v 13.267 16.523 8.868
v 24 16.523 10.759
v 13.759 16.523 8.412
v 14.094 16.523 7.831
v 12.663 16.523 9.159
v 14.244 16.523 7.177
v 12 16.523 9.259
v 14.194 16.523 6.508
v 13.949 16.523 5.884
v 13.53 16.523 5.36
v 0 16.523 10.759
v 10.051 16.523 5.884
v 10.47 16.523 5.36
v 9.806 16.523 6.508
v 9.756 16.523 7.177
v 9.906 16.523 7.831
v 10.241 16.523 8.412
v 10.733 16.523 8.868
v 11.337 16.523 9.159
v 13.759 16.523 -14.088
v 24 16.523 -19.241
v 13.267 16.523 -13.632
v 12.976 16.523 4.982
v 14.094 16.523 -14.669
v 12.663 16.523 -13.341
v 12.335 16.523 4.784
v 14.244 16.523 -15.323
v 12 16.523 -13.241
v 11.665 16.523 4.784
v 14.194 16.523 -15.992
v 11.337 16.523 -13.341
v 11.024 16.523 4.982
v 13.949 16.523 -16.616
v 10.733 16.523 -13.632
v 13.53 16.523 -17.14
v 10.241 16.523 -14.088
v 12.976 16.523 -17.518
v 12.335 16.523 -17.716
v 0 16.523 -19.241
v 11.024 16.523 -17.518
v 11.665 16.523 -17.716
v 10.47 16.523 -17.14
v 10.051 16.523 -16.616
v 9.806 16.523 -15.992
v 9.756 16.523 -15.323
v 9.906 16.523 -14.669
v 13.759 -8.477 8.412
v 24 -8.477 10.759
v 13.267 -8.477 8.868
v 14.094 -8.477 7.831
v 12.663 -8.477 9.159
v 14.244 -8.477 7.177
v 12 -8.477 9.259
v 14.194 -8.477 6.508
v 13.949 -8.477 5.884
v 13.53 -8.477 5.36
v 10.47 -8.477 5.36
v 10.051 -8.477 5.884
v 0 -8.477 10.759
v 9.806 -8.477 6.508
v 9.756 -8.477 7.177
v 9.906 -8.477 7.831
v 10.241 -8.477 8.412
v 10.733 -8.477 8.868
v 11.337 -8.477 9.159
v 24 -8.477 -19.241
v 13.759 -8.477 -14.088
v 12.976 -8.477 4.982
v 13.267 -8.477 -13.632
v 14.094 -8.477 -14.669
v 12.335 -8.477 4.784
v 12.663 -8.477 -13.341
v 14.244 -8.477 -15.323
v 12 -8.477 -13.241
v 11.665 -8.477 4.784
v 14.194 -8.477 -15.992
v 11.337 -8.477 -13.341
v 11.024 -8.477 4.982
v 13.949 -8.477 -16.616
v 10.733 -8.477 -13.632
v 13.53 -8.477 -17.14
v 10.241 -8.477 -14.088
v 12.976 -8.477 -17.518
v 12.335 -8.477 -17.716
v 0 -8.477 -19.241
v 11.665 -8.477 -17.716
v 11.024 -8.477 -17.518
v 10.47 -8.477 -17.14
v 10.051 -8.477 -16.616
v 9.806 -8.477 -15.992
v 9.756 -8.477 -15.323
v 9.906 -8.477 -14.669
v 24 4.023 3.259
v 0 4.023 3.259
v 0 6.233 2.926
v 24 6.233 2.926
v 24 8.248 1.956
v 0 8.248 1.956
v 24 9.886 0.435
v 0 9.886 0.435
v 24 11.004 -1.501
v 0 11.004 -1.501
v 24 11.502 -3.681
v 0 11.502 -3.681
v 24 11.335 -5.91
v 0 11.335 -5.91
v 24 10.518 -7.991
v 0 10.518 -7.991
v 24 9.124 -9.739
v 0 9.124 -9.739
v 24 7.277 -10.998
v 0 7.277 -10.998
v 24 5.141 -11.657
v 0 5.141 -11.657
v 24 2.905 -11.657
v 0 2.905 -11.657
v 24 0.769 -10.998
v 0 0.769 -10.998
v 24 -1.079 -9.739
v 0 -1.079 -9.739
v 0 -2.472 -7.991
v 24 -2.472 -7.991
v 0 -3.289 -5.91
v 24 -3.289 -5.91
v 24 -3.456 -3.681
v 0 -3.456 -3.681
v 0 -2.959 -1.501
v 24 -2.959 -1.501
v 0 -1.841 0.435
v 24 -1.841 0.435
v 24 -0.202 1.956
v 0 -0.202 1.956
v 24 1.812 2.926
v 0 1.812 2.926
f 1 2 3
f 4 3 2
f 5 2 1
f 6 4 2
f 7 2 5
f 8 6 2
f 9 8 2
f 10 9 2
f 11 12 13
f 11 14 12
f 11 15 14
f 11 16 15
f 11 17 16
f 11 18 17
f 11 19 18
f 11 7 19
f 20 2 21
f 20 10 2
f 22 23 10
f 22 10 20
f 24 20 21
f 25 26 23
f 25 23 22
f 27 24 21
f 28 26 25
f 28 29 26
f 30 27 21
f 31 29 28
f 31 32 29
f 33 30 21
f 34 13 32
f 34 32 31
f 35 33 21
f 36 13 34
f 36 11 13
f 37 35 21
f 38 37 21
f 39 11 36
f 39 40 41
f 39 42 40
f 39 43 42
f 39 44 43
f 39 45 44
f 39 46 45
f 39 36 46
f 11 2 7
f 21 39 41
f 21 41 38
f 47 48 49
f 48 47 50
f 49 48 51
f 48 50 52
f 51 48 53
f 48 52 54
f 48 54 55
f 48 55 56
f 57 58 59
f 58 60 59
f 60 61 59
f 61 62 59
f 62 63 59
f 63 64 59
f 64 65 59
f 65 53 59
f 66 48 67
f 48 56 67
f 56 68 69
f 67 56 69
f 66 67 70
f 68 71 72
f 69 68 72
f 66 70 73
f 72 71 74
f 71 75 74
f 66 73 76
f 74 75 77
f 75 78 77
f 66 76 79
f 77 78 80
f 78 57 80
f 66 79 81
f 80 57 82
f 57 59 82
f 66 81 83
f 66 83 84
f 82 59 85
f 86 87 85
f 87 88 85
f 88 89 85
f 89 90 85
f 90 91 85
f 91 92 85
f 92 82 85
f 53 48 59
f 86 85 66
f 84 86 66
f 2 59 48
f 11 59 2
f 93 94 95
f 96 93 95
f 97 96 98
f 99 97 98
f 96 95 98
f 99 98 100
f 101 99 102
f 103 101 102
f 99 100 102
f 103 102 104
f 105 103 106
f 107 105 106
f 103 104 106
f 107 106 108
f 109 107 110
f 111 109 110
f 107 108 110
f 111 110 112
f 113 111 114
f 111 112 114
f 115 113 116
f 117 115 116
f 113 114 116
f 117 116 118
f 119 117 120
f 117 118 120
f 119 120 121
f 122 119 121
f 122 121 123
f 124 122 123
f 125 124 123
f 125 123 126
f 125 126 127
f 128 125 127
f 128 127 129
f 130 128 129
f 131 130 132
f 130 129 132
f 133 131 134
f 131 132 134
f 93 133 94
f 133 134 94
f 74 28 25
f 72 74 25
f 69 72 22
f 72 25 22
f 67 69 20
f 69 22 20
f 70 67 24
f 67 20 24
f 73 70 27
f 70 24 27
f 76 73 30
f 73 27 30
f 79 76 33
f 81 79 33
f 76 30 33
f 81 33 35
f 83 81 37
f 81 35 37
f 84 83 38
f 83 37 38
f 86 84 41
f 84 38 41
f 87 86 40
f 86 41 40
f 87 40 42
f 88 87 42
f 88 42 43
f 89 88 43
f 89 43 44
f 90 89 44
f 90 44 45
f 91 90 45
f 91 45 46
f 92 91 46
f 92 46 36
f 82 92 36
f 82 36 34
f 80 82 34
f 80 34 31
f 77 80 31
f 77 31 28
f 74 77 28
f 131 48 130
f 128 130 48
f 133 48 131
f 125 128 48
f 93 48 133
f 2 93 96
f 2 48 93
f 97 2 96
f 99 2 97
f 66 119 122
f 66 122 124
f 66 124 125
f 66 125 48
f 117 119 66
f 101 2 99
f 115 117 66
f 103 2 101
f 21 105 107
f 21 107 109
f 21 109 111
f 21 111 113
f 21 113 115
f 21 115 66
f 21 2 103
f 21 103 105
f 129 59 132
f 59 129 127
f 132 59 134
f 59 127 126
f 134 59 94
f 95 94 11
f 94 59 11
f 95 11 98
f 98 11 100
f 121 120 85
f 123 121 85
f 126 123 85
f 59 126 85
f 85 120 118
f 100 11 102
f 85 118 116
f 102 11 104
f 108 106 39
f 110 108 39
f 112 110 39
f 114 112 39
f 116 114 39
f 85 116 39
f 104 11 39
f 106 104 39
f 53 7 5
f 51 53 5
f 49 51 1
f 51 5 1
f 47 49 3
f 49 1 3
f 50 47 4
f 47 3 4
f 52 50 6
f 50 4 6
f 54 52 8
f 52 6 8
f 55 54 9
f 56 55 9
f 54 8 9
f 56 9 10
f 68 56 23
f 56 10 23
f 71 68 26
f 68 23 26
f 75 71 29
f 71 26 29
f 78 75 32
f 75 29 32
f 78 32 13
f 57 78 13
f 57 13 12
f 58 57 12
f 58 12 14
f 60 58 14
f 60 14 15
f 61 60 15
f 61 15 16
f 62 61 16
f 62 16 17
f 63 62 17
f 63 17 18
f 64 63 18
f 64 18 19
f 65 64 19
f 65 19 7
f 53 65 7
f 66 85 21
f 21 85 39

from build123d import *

# Parameters (mm, degrees)
CROQUIS1_W              = 30
CROQUIS1_H              = 25
SALIENTE_EXTRUIR1_DEPTH = 24
CROQUIS2_R              = 7.5
CORTAR_EXTRUIR1_DEPTH   = 24
CORTAR_EXTRUIR4_REACH   = 41.639
CROQUIS4_R              = 2.25


with BuildPart() as part:
    # Croquis1 → Saliente-Extruir1 (new body)
    with BuildSketch(Plane(origin=(0, 0, 0), x_dir=(0, 0, -1), z_dir=(1, 0, 0))):
        with Locations((4.241023359, 4.022714127)):
            Rectangle(CROQUIS1_W, CROQUIS1_H)
    extrude(amount=SALIENTE_EXTRUIR1_DEPTH)

    # Croquis2 → Cortar-Extruir1 (cut)
    with BuildSketch(Plane.ZY):
        with Locations((-4.241023359, 4.022714127)):
            Circle(CROQUIS2_R)
    extrude(amount=-CORTAR_EXTRUIR1_DEPTH, mode=Mode.SUBTRACT)

    # Croquis4 → Cortar-Extruir4 (cut, up to next)
    with BuildSketch(Plane(origin=(0, 16.522714127, 0), x_dir=(1, 0, 0), z_dir=(0, 1, 0)), mode=Mode.PRIVATE) as cortar_extruir4_sk1:
        with Locations(Location((12, 15.491023359, 0), (0, 0, 270))):
            Circle(CROQUIS4_R)
    cortar_extruir4_tool1 = extrude(cortar_extruir4_sk1.sketch, amount=-CORTAR_EXTRUIR4_REACH, mode=Mode.PRIVATE) & part.part
    # Croquis4 → Cortar-Extruir4 (cut, up to next)
    with BuildSketch(Plane(origin=(0, 16.522714127, 0), x_dir=(1, 0, 0), z_dir=(0, 1, 0)), mode=Mode.PRIVATE) as cortar_extruir4_sk2:
        with Locations(Location((12, -7.008976641, 0), (0, 0, 270))):
            Circle(CROQUIS4_R)
    cortar_extruir4_tool2 = extrude(cortar_extruir4_sk2.sketch, amount=-CORTAR_EXTRUIR4_REACH, mode=Mode.PRIVATE) & part.part
    add(cortar_extruir4_tool1.solids().sort_by_distance((12, 16.522714, -15.491023))[0], mode=Mode.SUBTRACT)
    add(cortar_extruir4_tool2.solids().sort_by_distance((12, 16.522714, 7.008977))[0], mode=Mode.SUBTRACT)


solid = part.part
